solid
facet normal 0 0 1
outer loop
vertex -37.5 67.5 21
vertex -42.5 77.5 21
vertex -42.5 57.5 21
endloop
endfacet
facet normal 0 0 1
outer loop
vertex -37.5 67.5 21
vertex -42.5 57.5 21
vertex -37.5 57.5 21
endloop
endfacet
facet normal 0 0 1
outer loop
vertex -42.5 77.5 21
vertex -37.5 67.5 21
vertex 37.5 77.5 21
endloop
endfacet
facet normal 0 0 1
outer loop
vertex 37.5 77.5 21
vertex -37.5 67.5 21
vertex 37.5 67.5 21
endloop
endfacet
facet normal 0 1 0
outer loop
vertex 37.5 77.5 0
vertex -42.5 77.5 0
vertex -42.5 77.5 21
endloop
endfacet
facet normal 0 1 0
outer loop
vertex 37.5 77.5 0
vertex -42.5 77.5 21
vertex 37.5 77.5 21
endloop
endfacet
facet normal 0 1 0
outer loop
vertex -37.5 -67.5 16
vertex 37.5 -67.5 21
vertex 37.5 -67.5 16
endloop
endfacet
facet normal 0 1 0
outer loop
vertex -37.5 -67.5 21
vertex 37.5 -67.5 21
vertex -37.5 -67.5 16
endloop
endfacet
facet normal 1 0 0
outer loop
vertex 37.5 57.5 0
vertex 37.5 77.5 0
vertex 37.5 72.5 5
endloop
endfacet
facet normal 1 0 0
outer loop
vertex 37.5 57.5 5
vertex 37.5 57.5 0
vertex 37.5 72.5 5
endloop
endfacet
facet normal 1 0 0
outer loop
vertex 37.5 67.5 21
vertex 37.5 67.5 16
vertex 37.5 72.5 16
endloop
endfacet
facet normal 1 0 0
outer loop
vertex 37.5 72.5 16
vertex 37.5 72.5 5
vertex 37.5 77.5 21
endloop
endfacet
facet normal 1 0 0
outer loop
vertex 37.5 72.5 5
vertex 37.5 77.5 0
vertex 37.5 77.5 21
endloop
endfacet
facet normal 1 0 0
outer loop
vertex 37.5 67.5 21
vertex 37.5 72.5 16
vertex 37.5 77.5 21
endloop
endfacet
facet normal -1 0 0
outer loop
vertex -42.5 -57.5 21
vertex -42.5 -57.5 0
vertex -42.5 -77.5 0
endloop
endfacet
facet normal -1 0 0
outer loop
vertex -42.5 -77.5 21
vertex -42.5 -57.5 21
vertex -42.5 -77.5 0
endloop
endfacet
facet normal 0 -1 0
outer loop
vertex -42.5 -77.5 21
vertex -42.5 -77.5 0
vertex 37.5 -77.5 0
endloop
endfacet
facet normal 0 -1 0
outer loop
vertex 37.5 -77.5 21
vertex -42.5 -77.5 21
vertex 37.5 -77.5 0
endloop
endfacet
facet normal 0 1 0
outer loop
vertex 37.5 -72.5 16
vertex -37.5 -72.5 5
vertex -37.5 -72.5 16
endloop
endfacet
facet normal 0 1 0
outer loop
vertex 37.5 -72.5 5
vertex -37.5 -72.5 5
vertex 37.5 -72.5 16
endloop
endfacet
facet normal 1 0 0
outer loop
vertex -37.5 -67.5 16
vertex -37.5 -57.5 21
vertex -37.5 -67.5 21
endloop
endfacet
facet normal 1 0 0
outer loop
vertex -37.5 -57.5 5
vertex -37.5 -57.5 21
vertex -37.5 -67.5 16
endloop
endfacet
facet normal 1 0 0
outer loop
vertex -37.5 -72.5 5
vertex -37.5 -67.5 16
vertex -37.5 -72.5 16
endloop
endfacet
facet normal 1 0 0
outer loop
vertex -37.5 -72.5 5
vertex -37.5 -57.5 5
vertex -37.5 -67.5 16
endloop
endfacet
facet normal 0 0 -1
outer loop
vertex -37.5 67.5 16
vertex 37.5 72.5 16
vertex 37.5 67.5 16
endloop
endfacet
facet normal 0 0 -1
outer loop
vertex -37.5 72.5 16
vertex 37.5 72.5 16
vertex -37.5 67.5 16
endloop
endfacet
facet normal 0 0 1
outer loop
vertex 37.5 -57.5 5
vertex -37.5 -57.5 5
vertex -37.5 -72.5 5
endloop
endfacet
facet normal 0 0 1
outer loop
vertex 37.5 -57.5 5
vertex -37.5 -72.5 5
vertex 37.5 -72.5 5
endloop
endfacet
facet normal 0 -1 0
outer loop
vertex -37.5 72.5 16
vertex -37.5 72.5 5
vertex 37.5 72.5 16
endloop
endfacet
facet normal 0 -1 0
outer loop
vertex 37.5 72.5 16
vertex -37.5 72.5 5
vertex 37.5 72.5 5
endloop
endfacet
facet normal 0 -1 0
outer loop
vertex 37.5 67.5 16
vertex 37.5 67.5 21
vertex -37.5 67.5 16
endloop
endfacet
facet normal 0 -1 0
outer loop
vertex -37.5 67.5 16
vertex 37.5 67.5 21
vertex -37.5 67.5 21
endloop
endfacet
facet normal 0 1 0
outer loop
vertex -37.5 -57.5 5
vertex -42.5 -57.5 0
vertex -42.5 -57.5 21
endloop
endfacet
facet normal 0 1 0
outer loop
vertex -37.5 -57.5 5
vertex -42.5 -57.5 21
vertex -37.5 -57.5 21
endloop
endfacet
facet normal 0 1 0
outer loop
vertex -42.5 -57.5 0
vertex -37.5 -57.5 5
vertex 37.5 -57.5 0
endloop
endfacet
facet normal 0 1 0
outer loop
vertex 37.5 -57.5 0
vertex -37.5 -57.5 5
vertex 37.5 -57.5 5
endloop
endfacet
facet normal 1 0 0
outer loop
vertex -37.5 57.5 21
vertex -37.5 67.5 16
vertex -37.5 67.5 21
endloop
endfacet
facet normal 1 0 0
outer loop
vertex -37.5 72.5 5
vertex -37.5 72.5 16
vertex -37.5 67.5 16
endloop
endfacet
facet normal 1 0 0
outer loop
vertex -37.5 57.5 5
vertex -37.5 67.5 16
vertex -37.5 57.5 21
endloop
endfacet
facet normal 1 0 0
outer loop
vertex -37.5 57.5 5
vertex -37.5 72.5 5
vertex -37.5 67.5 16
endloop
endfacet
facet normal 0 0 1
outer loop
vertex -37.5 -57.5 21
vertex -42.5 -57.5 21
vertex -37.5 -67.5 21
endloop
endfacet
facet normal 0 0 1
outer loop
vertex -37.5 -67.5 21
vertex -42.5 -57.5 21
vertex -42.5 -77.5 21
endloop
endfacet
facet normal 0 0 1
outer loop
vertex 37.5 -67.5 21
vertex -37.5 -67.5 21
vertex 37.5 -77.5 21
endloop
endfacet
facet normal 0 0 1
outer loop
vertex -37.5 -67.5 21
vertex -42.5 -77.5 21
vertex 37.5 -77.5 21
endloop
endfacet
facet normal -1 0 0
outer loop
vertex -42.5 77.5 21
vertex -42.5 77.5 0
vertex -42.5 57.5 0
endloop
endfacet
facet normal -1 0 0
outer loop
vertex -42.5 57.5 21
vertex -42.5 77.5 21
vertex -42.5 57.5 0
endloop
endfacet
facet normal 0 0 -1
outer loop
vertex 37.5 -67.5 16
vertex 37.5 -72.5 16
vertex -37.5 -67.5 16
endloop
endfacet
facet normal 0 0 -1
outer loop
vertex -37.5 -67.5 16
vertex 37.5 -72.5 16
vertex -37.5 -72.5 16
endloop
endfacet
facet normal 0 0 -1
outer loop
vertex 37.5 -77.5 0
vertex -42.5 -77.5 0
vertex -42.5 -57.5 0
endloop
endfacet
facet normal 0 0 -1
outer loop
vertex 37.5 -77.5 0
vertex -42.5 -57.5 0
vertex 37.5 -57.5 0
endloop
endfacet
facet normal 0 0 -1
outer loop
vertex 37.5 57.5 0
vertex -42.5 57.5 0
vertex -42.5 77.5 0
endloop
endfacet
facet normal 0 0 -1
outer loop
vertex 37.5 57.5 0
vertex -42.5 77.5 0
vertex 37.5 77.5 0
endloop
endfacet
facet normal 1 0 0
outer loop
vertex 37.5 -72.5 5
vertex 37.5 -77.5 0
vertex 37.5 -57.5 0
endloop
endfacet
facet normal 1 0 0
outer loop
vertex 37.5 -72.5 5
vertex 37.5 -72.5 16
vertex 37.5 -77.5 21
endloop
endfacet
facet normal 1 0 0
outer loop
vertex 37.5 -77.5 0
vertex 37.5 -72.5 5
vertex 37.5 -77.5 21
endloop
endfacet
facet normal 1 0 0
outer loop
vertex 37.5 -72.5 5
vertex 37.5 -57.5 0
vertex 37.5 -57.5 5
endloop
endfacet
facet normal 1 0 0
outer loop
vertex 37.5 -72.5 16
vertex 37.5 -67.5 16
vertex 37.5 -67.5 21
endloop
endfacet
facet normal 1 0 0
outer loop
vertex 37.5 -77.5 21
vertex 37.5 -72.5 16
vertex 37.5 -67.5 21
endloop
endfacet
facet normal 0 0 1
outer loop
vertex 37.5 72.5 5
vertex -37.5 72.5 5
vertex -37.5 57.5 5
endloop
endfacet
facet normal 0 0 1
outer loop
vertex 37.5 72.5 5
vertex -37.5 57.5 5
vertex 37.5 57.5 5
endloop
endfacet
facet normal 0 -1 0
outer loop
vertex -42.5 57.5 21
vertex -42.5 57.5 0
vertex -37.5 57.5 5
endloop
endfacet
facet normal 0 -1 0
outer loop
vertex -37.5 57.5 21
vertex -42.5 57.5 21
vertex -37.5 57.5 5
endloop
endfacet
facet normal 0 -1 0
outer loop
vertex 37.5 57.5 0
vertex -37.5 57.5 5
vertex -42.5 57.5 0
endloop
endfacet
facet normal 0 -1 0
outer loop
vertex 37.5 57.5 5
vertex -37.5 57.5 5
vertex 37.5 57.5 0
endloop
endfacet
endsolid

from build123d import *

# Parameters (mm, degrees)
F0_W      = 75
F0_H      = 155
F1_DEPTH  = 5
F2_W      = 75
F2_H      = 5
F3_DEPTH  = 11
F4_W      = 75
F4_H      = 5
F5_DEPTH  = 5
F5_FACE_W = 75
F5_FACE_H = 5
F6_DEPTH  = 5
F8_W      = 75
F8_H      = 5
F9_DEPTH  = 11
F10_W     = 75
F10_H     = 5
F11_DEPTH = 10
F12_W     = 5
F12_H     = 155
F13_DEPTH = 21
F14_W     = 211.5539
F14_H     = 115
F15_DEPTH = 5.001
F16_DEPTH = 25


with BuildPart() as f1:
    # F0 (on Top) → F1 (new body)
    with BuildSketch(Plane.XY):
        Rectangle(F0_W, F0_H)
    extrude(amount=F1_DEPTH)

    # F2 (on face) → F3 (join)
    with BuildSketch(Plane.XY.offset(5)):
        with Locations((0, -75)):
            Rectangle(F2_W, F2_H)
    extrude(amount=F3_DEPTH)


with BuildPart() as f5:
    # F4 (on face) → F5 (new body)
    with BuildSketch(Plane(origin=(0, -72.5, 0), x_dir=(-1, 0, 0), z_dir=(0, 1, 0))):
        with Locations((0, 18.5)):
            Rectangle(F4_W, F4_H)
    extrude(amount=F5_DEPTH)


with BuildPart() as f6:
    # F5_face (on face) → F6 (new body)
    with BuildSketch(Plane(origin=(0, -72.5, 18.5), x_dir=(-1, 0, 0), z_dir=(0, -1, 0))):
        Rectangle(F5_FACE_W, F5_FACE_H)
    extrude(amount=F6_DEPTH)

    # F7: union F5, F1
    add(f5.part)
    add(f1.part)

    # F8 (on face) → F9 (join)
    with BuildSketch(Plane.XY.offset(5)):
        with Locations((0, 75)):
            Rectangle(F8_W, F8_H)
    extrude(amount=F9_DEPTH)

    # F10 (on face) → F11 (join)
    with BuildSketch(Plane(origin=(0, 77.5, 0), x_dir=(-1, 0, 0), z_dir=(0, 1, 0))):
        with Locations((0, 18.5)):
            Rectangle(F10_W, F10_H)
    extrude(amount=-F11_DEPTH)

    # F12 (on face) → F13 (join, through all)
    with BuildSketch(Plane(origin=(0, 0, 0), x_dir=(1, 0, 0), z_dir=(0, 0, -1))):
        with Locations((-40, 0)):
            Rectangle(F12_W, F12_H)
    extrude(amount=-F13_DEPTH)

    # F14 (on face) → F15 (cut, through all)
    with BuildSketch(Plane.XY.offset(5)):
        Rectangle(F14_W, F14_H)
    extrude(amount=-F15_DEPTH, mode=Mode.SUBTRACT)

    # F14 (on face) → F16 (cut)
    with BuildSketch(Plane.XY.offset(5)):
        Rectangle(F14_W, F14_H)
    extrude(amount=F16_DEPTH, mode=Mode.SUBTRACT)


solid = f6.part
